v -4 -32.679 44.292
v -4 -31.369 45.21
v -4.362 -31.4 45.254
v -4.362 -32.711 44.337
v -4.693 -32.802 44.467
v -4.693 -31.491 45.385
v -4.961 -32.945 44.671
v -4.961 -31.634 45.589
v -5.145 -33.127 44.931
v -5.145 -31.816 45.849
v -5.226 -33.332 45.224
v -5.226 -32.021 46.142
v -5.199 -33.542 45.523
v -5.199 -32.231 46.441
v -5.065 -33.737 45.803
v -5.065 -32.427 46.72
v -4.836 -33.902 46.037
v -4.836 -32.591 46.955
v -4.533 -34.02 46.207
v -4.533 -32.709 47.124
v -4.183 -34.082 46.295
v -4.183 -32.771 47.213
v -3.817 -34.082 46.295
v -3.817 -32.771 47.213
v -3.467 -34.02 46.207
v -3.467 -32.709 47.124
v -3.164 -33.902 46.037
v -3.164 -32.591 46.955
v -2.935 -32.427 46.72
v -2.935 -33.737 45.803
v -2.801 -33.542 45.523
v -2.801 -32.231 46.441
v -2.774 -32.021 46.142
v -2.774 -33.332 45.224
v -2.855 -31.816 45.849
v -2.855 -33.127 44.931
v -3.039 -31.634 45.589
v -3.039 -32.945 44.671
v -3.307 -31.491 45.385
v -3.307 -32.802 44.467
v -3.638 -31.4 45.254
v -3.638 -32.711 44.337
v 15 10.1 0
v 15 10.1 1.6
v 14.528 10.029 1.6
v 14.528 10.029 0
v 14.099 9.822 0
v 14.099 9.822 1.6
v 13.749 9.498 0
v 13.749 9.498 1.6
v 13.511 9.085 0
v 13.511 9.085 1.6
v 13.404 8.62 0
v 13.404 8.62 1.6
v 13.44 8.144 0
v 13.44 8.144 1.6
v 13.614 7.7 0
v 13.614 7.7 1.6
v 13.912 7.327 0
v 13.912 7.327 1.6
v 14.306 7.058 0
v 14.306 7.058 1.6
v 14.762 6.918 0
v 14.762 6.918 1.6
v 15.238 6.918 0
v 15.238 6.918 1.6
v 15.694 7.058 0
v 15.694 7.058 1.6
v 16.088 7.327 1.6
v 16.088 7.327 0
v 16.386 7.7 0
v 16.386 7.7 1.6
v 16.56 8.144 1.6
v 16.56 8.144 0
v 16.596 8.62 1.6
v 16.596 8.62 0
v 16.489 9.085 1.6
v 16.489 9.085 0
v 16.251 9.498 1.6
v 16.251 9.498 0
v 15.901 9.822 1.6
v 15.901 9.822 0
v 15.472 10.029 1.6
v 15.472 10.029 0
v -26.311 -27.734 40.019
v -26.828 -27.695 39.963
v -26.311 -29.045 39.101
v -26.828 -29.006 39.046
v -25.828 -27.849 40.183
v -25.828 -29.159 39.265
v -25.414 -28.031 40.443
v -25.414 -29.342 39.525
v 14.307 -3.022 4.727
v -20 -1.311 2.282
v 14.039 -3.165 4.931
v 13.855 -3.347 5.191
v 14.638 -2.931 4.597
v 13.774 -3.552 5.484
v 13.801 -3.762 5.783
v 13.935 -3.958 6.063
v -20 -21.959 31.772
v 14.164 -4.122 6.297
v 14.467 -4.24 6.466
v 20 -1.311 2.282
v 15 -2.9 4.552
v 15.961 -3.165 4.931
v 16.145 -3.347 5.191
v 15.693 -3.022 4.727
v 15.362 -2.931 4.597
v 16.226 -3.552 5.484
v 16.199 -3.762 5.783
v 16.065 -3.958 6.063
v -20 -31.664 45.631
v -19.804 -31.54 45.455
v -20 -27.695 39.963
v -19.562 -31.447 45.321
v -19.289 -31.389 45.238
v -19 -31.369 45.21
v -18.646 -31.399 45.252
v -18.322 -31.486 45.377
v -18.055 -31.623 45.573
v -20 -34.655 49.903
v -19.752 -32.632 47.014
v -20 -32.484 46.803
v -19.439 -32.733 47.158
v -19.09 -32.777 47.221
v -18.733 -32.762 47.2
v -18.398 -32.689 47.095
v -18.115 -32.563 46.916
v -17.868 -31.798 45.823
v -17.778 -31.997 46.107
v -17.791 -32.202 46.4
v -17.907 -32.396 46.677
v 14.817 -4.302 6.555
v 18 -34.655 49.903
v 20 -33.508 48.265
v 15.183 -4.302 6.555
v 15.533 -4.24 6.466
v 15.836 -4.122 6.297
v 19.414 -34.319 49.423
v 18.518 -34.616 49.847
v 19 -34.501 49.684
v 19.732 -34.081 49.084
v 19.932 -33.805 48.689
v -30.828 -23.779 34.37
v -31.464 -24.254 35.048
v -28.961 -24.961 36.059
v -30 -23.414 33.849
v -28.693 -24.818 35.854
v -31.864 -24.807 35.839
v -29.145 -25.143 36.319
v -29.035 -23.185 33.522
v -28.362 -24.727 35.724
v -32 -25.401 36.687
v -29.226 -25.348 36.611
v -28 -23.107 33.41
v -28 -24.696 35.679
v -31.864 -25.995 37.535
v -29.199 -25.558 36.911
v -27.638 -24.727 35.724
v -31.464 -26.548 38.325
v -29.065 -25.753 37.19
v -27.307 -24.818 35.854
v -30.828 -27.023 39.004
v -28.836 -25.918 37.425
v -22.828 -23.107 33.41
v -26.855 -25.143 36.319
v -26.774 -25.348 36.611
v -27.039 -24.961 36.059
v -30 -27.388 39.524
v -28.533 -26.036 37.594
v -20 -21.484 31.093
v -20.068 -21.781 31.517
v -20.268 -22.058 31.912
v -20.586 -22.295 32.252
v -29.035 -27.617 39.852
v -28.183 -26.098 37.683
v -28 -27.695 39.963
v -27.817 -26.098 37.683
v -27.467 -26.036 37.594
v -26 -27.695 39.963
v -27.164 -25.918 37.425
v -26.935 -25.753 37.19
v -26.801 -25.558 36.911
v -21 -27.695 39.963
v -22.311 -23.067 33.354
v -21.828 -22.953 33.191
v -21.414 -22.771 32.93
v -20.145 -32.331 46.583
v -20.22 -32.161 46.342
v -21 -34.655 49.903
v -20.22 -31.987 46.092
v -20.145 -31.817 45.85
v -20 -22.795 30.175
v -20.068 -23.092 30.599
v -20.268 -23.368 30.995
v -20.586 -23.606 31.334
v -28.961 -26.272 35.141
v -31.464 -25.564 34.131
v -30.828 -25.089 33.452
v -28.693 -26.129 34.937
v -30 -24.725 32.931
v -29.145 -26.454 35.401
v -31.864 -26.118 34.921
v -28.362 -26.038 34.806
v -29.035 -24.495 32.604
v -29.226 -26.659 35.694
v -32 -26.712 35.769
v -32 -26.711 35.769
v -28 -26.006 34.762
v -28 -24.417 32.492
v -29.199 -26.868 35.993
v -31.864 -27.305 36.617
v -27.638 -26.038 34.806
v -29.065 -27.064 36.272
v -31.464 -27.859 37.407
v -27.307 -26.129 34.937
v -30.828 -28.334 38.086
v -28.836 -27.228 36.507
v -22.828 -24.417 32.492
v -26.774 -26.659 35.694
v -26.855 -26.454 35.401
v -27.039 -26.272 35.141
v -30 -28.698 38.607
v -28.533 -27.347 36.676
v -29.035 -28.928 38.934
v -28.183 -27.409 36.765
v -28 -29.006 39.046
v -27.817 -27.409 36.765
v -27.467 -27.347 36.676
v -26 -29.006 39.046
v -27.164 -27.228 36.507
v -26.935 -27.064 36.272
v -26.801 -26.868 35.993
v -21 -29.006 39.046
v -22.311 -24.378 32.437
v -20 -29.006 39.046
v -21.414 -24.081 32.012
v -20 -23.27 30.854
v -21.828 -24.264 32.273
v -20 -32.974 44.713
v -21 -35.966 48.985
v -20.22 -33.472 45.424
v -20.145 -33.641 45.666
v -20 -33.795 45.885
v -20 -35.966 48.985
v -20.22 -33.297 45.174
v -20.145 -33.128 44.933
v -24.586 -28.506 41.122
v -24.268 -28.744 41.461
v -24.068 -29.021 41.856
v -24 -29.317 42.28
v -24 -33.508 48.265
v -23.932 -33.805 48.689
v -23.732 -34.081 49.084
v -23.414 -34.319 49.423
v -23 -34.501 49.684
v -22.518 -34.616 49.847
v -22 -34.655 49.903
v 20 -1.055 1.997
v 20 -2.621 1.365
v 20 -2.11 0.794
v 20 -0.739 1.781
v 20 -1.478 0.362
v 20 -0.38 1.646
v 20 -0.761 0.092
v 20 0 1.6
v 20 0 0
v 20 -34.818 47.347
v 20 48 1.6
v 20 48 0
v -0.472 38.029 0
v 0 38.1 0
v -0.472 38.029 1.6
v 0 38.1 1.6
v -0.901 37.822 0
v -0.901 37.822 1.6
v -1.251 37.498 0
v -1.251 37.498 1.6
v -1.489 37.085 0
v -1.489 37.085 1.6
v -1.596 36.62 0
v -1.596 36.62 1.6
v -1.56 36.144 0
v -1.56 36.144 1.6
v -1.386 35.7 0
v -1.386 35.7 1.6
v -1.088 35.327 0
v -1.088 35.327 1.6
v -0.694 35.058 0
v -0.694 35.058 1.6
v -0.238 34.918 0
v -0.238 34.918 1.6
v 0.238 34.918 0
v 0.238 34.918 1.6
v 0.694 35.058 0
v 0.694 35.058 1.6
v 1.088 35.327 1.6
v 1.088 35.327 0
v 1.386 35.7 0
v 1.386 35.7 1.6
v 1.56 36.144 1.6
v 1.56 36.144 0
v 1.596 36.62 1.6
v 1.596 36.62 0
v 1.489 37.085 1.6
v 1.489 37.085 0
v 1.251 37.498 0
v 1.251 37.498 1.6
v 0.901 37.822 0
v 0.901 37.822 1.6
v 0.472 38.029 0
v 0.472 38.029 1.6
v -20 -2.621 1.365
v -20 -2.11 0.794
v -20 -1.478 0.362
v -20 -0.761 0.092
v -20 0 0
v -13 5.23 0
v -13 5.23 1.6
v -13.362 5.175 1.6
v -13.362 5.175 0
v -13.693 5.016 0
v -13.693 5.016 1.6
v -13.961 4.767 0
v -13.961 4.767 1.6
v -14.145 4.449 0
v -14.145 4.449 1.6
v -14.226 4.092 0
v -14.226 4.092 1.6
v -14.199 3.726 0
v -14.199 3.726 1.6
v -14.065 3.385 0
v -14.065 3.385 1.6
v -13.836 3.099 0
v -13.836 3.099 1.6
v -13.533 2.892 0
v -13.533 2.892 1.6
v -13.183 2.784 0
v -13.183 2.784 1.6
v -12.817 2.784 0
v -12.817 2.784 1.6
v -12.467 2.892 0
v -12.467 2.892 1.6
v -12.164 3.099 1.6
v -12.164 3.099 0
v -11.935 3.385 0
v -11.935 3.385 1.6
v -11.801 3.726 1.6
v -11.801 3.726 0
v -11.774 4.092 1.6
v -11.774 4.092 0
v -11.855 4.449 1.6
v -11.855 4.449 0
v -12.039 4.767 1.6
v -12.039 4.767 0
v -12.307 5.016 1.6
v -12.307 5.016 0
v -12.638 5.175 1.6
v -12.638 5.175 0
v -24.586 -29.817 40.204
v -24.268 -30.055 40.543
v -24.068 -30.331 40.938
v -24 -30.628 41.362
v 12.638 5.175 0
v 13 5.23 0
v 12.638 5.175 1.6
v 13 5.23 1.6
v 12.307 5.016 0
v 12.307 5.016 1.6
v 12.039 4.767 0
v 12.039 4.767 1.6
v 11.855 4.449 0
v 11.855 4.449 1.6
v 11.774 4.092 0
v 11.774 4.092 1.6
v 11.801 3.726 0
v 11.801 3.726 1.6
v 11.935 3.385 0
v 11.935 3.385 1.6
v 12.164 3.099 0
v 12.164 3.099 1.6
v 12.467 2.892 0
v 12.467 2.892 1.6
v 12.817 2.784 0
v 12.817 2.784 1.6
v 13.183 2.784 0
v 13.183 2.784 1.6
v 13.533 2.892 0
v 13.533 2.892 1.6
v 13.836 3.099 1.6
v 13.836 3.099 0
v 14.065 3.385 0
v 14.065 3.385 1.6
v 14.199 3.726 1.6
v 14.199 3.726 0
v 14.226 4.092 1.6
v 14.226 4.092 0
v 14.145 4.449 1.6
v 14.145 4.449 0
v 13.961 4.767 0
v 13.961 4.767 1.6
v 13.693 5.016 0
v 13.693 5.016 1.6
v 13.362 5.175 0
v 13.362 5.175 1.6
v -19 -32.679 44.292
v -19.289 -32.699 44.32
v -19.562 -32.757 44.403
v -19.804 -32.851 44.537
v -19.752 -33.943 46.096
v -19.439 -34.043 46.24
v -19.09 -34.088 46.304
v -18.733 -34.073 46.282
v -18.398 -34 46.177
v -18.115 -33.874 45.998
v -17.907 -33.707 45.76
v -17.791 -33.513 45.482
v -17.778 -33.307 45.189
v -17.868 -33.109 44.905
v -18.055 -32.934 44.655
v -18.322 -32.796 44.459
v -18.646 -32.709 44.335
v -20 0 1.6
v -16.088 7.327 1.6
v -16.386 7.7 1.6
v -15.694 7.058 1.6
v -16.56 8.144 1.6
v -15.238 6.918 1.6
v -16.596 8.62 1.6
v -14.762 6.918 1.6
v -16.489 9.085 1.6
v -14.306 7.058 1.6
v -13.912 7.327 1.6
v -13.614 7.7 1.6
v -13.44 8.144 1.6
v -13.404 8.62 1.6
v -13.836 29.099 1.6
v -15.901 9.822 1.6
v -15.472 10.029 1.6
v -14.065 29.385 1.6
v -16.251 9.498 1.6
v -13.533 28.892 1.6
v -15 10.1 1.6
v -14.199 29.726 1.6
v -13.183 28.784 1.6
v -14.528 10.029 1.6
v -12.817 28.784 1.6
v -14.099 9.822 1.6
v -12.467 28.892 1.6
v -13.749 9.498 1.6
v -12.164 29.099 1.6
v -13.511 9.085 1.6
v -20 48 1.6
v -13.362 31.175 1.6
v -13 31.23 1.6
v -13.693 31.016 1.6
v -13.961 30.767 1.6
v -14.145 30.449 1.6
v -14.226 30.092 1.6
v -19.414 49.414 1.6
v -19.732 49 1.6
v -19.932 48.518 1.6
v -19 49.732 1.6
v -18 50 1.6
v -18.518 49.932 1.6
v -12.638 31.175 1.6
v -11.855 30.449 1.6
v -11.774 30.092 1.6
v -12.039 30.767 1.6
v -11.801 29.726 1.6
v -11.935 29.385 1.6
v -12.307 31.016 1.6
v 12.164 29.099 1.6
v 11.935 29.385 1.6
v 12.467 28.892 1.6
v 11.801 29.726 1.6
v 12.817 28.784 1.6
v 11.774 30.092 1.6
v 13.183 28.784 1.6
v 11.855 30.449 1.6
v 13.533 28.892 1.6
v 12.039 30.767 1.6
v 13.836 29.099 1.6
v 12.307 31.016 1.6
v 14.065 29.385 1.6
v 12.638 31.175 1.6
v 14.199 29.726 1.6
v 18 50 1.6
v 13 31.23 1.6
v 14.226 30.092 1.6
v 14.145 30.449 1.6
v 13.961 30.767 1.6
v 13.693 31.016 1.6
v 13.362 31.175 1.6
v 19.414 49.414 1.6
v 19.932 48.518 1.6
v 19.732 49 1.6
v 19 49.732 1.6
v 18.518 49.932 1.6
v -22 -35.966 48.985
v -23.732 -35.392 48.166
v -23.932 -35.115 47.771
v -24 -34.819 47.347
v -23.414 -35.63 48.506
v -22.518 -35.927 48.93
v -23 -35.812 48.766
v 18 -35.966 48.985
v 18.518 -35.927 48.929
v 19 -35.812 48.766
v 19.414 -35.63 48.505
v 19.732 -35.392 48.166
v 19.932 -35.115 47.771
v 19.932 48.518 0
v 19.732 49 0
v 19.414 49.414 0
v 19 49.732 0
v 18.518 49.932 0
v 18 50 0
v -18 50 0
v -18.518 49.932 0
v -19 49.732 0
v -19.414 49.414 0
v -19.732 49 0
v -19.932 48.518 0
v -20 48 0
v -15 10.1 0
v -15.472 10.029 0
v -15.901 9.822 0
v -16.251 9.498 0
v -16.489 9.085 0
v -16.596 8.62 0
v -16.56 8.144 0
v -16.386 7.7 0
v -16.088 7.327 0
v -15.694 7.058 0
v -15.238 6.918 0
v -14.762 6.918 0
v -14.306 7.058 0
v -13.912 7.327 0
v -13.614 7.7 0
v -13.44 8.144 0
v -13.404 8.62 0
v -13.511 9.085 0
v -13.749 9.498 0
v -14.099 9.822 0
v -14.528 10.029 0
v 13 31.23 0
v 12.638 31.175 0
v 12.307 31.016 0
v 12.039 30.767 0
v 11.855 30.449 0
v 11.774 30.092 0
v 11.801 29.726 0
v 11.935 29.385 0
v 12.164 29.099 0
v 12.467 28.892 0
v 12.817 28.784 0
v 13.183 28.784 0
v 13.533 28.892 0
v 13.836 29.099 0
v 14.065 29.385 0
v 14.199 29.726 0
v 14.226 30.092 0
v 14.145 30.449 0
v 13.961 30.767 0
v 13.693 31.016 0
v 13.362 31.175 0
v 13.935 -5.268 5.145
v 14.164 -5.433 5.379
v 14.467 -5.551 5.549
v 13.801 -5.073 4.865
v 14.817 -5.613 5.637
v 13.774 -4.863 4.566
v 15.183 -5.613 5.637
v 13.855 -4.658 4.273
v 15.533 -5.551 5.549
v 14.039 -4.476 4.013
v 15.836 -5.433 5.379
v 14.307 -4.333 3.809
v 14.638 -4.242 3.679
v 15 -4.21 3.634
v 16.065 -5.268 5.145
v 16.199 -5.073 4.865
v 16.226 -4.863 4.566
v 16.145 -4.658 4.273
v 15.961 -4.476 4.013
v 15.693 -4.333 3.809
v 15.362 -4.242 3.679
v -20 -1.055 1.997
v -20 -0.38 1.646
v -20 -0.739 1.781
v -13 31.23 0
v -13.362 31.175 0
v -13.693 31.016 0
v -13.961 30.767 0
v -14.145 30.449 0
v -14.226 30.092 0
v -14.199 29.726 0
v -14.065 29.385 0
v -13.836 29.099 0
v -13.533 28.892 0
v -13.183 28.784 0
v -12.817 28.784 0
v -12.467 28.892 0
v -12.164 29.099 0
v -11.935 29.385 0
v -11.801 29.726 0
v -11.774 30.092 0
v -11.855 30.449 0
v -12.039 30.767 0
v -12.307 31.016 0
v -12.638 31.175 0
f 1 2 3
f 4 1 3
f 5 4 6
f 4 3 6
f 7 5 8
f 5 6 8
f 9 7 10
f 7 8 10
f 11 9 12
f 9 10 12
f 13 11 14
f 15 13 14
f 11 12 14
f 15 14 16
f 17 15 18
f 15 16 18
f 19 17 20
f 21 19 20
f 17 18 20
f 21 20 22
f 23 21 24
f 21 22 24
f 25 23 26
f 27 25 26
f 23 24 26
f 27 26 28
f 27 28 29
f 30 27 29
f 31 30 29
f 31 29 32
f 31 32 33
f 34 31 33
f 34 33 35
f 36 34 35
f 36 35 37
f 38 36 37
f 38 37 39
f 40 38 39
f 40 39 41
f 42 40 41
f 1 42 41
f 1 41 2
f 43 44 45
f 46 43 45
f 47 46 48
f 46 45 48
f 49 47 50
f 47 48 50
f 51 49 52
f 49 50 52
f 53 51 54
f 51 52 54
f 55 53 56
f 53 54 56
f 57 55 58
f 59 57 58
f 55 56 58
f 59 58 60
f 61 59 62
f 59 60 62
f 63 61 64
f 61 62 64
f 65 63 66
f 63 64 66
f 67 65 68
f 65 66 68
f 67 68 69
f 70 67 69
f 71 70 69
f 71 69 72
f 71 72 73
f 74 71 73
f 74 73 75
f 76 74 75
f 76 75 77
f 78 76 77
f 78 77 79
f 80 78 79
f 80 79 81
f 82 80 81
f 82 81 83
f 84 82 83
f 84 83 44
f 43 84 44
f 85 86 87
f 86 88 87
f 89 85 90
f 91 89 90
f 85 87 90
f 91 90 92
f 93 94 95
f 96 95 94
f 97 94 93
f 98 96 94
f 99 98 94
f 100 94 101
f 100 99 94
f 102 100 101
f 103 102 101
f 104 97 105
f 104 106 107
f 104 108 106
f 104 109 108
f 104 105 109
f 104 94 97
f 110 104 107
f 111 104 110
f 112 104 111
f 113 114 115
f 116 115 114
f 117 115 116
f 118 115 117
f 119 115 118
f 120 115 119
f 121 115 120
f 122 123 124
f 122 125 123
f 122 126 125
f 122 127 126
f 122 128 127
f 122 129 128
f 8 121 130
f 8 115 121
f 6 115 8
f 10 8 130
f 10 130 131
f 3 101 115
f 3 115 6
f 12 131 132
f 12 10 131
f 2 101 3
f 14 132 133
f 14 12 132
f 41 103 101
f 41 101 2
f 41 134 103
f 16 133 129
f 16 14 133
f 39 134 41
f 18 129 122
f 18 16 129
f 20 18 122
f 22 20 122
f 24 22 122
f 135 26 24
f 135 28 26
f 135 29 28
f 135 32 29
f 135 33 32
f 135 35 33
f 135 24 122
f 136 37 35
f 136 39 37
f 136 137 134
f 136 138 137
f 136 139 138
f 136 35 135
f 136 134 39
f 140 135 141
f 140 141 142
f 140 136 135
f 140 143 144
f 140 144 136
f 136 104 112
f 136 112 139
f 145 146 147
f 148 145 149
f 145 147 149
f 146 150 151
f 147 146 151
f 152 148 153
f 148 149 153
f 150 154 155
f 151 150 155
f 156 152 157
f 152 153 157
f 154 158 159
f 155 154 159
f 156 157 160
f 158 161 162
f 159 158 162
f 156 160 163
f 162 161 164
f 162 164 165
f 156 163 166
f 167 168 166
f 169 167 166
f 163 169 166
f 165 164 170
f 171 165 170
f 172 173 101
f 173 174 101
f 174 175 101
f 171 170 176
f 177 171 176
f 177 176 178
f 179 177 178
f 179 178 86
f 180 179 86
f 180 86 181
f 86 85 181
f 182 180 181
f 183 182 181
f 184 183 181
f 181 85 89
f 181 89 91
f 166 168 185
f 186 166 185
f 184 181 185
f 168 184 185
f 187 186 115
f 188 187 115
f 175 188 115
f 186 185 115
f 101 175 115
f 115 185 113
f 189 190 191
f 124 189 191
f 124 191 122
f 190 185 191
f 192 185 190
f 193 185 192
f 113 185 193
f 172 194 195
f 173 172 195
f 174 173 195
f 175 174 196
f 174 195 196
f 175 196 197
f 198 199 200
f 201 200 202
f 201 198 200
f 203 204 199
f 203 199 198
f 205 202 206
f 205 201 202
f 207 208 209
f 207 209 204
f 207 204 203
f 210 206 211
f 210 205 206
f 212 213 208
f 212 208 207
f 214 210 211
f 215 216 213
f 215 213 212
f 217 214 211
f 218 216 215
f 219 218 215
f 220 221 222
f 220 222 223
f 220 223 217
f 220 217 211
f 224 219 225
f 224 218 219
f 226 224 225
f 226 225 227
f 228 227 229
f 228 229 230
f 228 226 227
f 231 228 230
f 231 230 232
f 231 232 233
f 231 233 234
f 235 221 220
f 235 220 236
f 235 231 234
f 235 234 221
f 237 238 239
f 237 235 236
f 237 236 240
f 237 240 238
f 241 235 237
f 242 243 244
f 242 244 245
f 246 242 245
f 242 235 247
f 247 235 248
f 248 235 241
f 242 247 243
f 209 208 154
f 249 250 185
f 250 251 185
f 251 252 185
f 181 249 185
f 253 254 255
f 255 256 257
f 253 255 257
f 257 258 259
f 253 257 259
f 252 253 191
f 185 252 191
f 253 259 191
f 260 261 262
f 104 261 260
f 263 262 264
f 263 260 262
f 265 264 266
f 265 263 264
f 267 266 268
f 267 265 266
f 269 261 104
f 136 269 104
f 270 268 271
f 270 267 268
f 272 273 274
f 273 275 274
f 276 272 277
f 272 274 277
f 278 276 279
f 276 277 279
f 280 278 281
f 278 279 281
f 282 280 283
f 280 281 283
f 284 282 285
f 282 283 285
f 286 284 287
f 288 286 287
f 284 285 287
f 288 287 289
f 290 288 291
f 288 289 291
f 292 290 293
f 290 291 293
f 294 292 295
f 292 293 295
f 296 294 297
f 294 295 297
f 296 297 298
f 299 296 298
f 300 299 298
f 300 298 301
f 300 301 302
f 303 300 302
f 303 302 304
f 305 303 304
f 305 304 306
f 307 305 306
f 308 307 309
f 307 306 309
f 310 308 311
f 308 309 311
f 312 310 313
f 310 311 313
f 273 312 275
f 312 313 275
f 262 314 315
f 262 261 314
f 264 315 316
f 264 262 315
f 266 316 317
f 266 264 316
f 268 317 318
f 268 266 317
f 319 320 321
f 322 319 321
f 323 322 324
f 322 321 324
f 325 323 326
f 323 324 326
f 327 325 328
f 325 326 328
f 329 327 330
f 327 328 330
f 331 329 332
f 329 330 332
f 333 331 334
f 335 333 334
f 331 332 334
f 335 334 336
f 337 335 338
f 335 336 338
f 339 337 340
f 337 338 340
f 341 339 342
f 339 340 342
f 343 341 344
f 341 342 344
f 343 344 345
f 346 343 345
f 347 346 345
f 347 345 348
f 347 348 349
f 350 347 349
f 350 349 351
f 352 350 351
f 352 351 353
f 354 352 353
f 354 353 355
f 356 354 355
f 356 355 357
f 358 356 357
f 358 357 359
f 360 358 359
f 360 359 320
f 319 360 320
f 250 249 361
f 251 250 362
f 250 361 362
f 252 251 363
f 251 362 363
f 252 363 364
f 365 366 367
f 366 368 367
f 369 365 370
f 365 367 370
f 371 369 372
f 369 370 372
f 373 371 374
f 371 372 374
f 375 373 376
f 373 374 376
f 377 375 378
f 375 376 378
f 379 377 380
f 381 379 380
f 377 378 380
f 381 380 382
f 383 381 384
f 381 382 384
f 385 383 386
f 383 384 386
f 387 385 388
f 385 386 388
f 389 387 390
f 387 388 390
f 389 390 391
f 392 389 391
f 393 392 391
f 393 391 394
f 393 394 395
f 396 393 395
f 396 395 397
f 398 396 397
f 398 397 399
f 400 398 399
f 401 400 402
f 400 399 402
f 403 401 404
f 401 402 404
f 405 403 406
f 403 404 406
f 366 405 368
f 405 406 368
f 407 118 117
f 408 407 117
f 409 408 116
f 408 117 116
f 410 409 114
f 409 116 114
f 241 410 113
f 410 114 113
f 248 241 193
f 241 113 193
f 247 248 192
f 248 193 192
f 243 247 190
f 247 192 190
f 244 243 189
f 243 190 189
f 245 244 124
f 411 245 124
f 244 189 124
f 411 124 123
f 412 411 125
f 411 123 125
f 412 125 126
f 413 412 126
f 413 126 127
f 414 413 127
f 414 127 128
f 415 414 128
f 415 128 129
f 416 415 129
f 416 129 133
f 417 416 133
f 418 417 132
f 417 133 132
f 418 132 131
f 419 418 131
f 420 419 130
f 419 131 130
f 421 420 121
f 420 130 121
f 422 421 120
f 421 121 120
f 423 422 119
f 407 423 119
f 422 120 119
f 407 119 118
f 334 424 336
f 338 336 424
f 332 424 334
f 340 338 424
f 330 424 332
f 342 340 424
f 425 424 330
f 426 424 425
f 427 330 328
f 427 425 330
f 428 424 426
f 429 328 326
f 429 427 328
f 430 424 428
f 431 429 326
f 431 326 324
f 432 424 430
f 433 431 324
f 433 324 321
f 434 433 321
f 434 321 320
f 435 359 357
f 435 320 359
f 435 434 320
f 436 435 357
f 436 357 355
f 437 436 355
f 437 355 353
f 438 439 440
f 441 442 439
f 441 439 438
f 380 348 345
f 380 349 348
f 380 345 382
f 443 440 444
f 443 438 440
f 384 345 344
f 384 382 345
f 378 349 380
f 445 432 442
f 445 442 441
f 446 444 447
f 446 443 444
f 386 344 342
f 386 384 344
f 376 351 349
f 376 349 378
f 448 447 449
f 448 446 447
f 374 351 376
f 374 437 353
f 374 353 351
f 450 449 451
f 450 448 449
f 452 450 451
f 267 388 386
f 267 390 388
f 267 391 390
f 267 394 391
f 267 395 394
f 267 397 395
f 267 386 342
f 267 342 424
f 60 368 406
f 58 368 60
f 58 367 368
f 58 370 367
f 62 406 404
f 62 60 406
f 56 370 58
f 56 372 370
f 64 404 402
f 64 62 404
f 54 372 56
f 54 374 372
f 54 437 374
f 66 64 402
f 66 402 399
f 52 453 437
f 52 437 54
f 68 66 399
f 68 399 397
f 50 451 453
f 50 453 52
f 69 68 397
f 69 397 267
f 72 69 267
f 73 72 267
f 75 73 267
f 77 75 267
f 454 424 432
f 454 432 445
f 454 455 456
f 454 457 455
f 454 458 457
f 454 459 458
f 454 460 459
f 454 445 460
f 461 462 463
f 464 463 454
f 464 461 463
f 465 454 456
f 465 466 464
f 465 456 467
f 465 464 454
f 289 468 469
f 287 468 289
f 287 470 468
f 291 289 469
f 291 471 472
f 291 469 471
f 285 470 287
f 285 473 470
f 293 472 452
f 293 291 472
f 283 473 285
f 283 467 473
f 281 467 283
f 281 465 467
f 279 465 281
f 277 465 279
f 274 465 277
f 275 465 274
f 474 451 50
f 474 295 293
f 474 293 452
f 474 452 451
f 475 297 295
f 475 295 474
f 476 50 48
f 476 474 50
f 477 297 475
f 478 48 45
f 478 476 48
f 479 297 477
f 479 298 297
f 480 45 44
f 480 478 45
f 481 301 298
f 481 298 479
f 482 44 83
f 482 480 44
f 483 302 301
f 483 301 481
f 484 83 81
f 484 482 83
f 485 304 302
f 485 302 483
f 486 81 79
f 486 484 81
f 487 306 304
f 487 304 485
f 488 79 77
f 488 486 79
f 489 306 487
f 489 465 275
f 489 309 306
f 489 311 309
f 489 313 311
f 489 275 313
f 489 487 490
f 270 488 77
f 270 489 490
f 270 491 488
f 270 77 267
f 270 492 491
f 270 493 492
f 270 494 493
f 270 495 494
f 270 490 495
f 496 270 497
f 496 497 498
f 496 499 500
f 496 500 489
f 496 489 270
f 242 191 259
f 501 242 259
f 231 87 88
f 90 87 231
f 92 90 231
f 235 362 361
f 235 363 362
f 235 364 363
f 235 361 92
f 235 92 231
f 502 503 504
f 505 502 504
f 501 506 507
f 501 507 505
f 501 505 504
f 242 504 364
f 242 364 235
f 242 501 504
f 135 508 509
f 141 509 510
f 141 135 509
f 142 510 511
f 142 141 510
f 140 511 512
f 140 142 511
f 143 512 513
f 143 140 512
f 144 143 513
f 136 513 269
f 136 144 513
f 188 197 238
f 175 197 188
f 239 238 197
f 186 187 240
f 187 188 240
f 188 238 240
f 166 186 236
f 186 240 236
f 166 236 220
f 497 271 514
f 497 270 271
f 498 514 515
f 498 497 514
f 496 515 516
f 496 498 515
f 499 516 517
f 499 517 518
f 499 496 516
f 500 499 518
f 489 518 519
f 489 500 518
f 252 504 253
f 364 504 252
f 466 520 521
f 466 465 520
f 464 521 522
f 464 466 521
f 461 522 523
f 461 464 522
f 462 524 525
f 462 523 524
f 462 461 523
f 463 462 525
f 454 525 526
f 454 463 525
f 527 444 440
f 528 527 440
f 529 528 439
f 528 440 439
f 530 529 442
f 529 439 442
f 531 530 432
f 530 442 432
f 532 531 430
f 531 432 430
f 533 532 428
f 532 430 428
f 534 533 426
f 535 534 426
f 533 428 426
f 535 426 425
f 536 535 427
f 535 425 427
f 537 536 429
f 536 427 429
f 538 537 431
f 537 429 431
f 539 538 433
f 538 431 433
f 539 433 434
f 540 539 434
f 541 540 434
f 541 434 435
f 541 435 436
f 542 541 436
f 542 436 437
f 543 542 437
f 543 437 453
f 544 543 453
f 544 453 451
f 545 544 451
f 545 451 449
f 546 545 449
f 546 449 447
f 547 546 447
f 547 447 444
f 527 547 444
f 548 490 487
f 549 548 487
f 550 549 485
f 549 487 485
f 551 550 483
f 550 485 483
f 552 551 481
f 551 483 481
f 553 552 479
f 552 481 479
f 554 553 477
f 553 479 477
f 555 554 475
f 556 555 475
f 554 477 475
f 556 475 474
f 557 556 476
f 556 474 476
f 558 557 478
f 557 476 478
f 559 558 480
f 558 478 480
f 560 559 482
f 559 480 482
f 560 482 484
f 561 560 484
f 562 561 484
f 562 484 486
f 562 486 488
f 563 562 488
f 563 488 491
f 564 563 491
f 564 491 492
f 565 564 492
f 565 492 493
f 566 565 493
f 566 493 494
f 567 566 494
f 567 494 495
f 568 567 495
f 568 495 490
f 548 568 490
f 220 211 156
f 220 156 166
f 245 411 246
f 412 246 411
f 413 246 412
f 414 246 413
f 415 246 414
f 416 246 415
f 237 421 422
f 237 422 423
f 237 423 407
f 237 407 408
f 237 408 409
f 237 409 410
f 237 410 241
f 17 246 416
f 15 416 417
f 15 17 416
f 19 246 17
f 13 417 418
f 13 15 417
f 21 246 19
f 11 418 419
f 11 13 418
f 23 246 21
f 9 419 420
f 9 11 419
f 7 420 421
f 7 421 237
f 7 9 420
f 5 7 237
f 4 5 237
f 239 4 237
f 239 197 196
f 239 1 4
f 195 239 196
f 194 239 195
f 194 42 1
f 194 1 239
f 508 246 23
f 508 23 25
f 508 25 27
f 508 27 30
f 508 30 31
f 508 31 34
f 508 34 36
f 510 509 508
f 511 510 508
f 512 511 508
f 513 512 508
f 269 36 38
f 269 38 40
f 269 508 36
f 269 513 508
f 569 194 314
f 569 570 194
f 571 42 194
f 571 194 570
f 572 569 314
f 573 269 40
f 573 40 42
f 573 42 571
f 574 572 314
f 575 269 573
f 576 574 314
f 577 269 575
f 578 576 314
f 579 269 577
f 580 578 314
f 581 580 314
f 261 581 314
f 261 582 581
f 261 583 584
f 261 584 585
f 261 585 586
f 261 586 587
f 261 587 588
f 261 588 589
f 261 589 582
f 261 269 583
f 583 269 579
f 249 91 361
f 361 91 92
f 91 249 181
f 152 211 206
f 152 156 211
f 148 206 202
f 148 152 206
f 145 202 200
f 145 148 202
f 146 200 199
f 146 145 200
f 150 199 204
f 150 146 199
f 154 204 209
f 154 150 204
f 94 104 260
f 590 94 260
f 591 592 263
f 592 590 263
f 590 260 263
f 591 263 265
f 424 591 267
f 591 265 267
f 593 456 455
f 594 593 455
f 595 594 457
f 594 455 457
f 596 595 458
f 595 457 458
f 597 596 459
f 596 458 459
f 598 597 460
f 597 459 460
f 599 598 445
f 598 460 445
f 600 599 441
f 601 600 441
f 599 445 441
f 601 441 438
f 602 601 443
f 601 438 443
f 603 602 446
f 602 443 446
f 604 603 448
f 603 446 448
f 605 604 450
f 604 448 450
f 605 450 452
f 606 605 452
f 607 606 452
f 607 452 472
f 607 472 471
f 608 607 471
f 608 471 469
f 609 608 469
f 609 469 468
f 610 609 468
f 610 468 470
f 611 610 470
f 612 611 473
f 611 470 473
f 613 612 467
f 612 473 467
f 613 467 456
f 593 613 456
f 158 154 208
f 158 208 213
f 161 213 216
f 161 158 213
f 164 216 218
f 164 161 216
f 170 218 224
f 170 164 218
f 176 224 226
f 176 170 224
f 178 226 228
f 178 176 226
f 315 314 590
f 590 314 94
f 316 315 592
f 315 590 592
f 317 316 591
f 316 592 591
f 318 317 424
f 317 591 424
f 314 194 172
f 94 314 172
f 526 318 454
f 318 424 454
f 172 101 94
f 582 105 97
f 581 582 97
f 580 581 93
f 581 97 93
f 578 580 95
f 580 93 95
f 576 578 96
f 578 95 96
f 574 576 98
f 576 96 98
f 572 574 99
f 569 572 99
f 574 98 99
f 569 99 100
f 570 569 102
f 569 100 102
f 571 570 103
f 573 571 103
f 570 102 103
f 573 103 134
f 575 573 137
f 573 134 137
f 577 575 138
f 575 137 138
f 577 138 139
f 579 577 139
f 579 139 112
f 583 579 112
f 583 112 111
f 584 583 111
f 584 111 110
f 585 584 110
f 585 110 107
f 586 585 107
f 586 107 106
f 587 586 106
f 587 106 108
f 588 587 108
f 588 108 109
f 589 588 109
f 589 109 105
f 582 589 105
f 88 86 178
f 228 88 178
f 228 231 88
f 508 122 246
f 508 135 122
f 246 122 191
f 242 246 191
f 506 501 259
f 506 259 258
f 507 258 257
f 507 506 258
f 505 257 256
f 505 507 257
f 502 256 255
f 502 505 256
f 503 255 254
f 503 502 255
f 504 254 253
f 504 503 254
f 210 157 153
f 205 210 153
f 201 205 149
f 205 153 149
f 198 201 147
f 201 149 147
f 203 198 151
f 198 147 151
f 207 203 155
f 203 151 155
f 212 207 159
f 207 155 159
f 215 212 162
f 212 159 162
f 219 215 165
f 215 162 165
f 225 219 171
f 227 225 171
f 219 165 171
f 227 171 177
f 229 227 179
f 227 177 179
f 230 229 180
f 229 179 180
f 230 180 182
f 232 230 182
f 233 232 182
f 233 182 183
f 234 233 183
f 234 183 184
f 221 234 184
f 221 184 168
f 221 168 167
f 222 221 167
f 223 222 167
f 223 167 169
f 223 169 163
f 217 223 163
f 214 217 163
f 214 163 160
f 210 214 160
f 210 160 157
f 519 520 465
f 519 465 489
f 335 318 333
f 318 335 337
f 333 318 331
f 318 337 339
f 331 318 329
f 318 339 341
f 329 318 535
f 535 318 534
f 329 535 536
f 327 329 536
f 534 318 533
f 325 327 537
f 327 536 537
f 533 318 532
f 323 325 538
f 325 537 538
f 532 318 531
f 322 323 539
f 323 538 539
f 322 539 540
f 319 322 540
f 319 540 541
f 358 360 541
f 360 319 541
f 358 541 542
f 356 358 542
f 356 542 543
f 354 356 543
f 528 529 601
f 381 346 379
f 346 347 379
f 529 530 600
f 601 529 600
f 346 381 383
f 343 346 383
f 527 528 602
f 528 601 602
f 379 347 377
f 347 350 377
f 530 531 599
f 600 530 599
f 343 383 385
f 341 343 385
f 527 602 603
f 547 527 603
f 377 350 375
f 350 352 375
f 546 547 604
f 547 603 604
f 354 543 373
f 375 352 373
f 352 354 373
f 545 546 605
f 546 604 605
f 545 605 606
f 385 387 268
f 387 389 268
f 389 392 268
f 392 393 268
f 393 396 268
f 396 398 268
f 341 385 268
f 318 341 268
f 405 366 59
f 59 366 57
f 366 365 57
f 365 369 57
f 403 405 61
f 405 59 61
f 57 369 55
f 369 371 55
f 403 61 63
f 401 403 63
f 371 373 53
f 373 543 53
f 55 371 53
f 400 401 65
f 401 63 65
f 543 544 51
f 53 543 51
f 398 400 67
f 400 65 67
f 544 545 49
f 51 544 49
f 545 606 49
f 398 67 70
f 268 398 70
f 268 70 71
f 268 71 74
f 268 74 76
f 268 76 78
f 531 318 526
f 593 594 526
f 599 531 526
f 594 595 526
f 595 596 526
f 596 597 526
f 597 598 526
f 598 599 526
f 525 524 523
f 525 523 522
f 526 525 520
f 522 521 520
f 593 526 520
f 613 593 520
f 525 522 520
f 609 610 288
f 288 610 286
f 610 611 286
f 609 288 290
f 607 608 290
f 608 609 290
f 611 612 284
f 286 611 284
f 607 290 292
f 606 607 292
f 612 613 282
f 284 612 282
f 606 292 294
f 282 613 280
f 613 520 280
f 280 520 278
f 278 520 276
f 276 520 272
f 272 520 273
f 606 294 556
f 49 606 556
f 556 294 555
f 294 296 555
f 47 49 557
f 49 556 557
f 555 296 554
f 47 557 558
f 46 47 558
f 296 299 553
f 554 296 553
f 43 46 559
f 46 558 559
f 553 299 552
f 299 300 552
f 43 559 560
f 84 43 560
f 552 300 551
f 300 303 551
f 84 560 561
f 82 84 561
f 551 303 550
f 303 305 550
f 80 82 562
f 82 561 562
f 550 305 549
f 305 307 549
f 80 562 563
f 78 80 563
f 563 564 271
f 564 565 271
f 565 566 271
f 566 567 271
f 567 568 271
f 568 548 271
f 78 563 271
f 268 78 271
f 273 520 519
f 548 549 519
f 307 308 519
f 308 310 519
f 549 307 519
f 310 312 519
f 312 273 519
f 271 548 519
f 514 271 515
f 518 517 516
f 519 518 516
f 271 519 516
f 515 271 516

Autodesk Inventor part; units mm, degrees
ref_plane "YZ Plane" through (0, 0, 0) normal (1, 0, 0) x (0, 1, 0)
ref_plane "XZ Plane" through (0, 0, 0) normal (0, 1, 0) x (-1, 0, 0)
ref_plane "XY Plane" through (0, 0, 0) normal (0, 0, 1) x (1, 0, 0)
sketch "スケッチ1" plane through (0, 0, 0) normal (0, 0, 1) x (1, 0, 0)
  line L0 (20, 0) -> (-20, 0)
  line L1 (-20, 0) -> (-20, 50)
  line L2 (-20, 50) -> (20, 50)
  line L3 (20, 50) -> (20, 0)
  line L4 (20, 0) -> (-20, 50) construction
  line L5 (-20, 0) -> (20, 50) construction
  point P0 (0, 0)
  point P1 (0, 25)
  point P2 (0, 0)
  point P3 (0, 25)
  dimension "d0" = 40
  dimension "d1" = 50
extrude "プレート1" add sketch "スケッチ1" along normal blind 1.6
sketch "スケッチ2" plane through (20, -1.3106, 2.2823) normal (0, -0.819152, -0.5735764) x (1, 0, 0)
  line L0 (-40, 0) -> (0, 0)
  line L1 (0, 0) -> (0, 58.1342)
  line L2 (0, 58.1342) -> (-40, 58.1342)
  line L3 (-40, 58.1342) -> (-40, 0)
edge flange "フランジ1" height 59.8 angle 55 thickness 1.6 bend radius 1.6 thickness toward (0, -0.819152, -0.5735764) relief tear relief width 1.6 relief depth 0.8 edges at (0, 0, 1.6) wall of the first edge with corners at (-20, -1.3106, 2.2823) (20, -1.3106, 2.2823) (20, -34.655, 49.903) (-20, -34.655, 49.903)
bend "曲げ1"
corner "コーナー1"
sketch "スケッチ3" plane through (0, 0, 0) normal (0, 0, -1) x (-1, 0, 0)
  line L0 (-20, 0) -> (20, 0) projected
  line L1 (20, 0) -> (20, 50) projected
  line L2 (20, 50) -> (-20, 50) projected
  line L3 (-20, 50) -> (-20, 0) projected
  line L4 (-20, 0) -> (20, 0) projected
  point P0 (0, 0)
  point P1 (-13, 4)
  point P2 (13, 4)
  point P3 (0, 4)
  point P4 (0, 0)
  point P5 (0, 0)
  point P6 (0, 4)
  point P7 (-13, 30)
  point P8 (13, 30)
  dimension "d62" = 4
  dimension "d85" = 26
  dimension "d86" = 13
  dimension "d90" = 26
hole "穴1" at (13, 4, 0) at (-13, 4, 0) at (13, 30, 0) at (-13, 30, 0) direction (0, 0, 1) diameter 2.459 depth 8.8 tip angle 118 thread size "M3x0.5" class "6H" standard "ISO Metric profile"
sketch "スケッチ4" plane through (-20, -35.9657, 48.9853) normal (0, -0.819152, -0.5735764) x (1, 0, 0)
  line L0 (0, -58.1342) -> (40, -58.1342) projected
  line L1 (40, 0) -> (40, -58.1342) projected
  line L2 (0, 0) -> (40, 0) projected
  line L3 (0, -58.1342) -> (0, 0) projected
  point P0 (20, -60.7555)
  point P1 (35, -54.1342)
  dimension "d23" = 5
  dimension "d24" = 4
hole "穴2" at (15, -4.9156, 4.6412) direction (0, 0.819152, 0.5735764) diameter 2.459 end through all thread size "M3x0.5" class "6H" standard "ISO Metric profile"
sketch "スケッチ5" plane through (-20, -35.9657, 48.9853) normal (0, -0.819152, -0.5735764) x (1, 0, 0)
  circle A0 centre (35, -54.1342) radius 1.2295 projected
  line L0 (0, 0) -> (0, -58.1342) projected
  line L1 (0, -12.1342) -> (-12, -12.1342)
  line L2 (-12, -12.1342) -> (-12, -20.1342)
  line L3 (-12, -20.1342) -> (0, -20.1342)
  line L4 (0, -20.1342) -> (0, -12.1342)
  point P0 (20, -60.7555)
  point P1 (-8, -16.1342)
  point P2 (0, -20.1342)
  dimension "d32" = 43
  dimension "d33" = 38
  dimension "d34" = 4
  dimension "d35" = 8
  dimension "d36" = 4
extrude "押し出し1" add sketch "スケッチ5" against normal up to surface (1.6 mm away) contours L0 L3 L2 L1
sketch "スケッチ6" plane through (-20, -35.9657, 48.9853) normal (0, -0.819152, -0.5735764) x (1, 0, 0)
  circle A0 centre (35, -54.1342) radius 1.2295 projected
  point P0 (20, -60.7555)
  point P1 (-8, -16.1342)
  dimension "d39" = 43
  dimension "d40" = 38
hole "穴3" at (-28, -26.7115, 35.7689) direction (0, 0.819152, 0.5735764) diameter 2.459 depth 8.8 tip angle 118 thread size "M3x0.5" class "6H" standard "ISO Metric profile"
fillet "フィレット1" radius 4 2 edges at (-32, -23.7619, 32.9512) (-32, -28.3505, 39.5044)
fillet "フィレット2" radius 2 2 edges at (20, 50, 0.8) (-20, 50, 0.8)
sketch "スケッチ8" plane through (-20, -35.9657, 48.9853) normal (0, -0.819152, -0.5735764) x (1, 0, 0)
  line L0 (0, 0) -> (0, -12.1342) projected
  line L1 (0, 0) -> (-1, 0)
  line L2 (-1, 0) -> (-1, -12.1342)
  line L3 (-1, -12.1342) -> (0, -12.1342)
  line L4 (0, -12.1342) -> (0, 0)
  point P0 (20, -60.7555)
  point P1 (0, -12.1342)
  dimension "d63" = 1
extrude "押し出し3" add sketch "スケッチ8" against normal up to surface (1.6 mm away)
sketch "スケッチ9" plane through (-20, -2.6213, 1.3646) normal (0, -0.819152, -0.5735764) x (1, 0, 0)
  line L0 (40, 58.1342) -> (-1, 58.1342) projected
  line L1 (-1, 58.1342) -> (-1, 46) projected
  point P0 (20, -2.6213)
  point P1 (1, 53.6342)
  point P2 (16, 53.6342)
  dimension "d66" = 4.5
  dimension "d67" = 15
  dimension "d68" = 2
hole "穴4" at (-19, -33.3846, 45.2991) at (-4, -33.3846, 45.2991) direction (0, 0.819152, 0.5735764) diameter 2.459 end through all thread size "M3x0.5" class "6H" standard "ISO Metric profile"
sketch "スケッチ10" plane through (-20, -2.6213, 1.3646) normal (0, -0.819152, -0.5735764) x (1, 0, 0)
  line L0 (43, 58.1342) -> (-4, 58.1342)
  line L1 (-4, 58.1342) -> (-4, 50.1342)
  line L2 (-4, 50.1342) -> (43, 50.1342)
  line L3 (43, 50.1342) -> (43, 58.1342)
  line L4 (-1, 58.1342) -> (-1, 46) projected
  line L5 (40, 58.1342) -> (40, 0) projected
  line L6 (-1, 46) -> (-8, 46) projected
  line L7 (-4, 50.1342) -> (-1, 50.1342)
  line L8 (-1, 50.1342) -> (-1, 46)
  line L9 (-1, 46) -> (-4, 46)
  line L10 (-4, 46) -> (-4, 50.1342)
  point P0 (20, -2.6213)
  point P1 (-4, 46)
  dimension "d76" = 3
  dimension "d77" = 3
  dimension "d78" = 8
extrude "押し出し4" add sketch "スケッチ10" against normal up to surface (1.6 mm away) contours L4 L2 L1 L0 | L4 L6 L10 L2
chamfer "面取り4" distance 2 angle 45 2 edges at (-20, -23.7619, 32.9512) (-24, -28.3505, 39.5044)
fillet "フィレット3" radius 2 6 edges at (-20, -22.6147, 31.3129) (-22, -23.7619, 32.9512) (-26, -28.3505, 39.5044) (-24, -29.4976, 41.1427) (-24, -35.3104, 49.4442) (20, -35.3104, 49.4442)
sketch "スケッチ12" plane through (0, 0, 0) normal (0, 0, -1) x (-1, 0, 0)
  line L0 (-15, 36.5) -> (15, 36.5)
  line L1 (15, 36.5) -> (15, 8.5)
  line L2 (15, 8.5) -> (-15, 8.5)
  line L3 (-15, 8.5) -> (-15, 36.5)
  line L4 (-20, 0) -> (20, 0) projected
  point P0 (0, 0)
  point P1 (0, 36.5)
  dimension "d91" = 28
  dimension "d92" = 30
  dimension "d93" = 15
  dimension "d94" = 8.5
hole "穴5" at (15, 8.5, 0) at (-15, 8.5, 0) at (0, 36.5, 0) direction (0, 0, 1) diameter 3.2 depth 1.6 tip angle 118
equation "\"d86\" = 0.5 * d85"
equation "\"d30\" = Thickness"
equation "\"d100\" = Thickness"
equation "\"d2\" = Thickness"
equation "\"d3\" = BendReliefWidth"
equation "\"d4\" = BendReliefDepth"
equation "\"d5\" = MinimumRemnant"
equation "\"d6\" = TransitionRadius"
equation "\"d9\" = BendRadius"
equation "\"d10\" = CornerReliefSize"
equation "\"d11\" = GapSize"
equation "\"d12\" = JacobiRadiusSize"
equation "\"BendRadius\" = Thickness"
equation "\"BendReliefWidth\" = Thickness"
equation "\"BendReliefDepth\" = 0.5 * Thickness"
equation "\"CornerReliefSize\" = 4 * Thickness"
equation "\"MinimumRemnant\" = 2 * Thickness"
equation "\"TransitionRadius\" = BendRadius"
equation "\"JacobiRadiusSize\" = BendRadius"
equation "\"GapSize\" = Thickness"
equation "\"Thickness\" = 1.6"
properties part number "Fan_Holder"
